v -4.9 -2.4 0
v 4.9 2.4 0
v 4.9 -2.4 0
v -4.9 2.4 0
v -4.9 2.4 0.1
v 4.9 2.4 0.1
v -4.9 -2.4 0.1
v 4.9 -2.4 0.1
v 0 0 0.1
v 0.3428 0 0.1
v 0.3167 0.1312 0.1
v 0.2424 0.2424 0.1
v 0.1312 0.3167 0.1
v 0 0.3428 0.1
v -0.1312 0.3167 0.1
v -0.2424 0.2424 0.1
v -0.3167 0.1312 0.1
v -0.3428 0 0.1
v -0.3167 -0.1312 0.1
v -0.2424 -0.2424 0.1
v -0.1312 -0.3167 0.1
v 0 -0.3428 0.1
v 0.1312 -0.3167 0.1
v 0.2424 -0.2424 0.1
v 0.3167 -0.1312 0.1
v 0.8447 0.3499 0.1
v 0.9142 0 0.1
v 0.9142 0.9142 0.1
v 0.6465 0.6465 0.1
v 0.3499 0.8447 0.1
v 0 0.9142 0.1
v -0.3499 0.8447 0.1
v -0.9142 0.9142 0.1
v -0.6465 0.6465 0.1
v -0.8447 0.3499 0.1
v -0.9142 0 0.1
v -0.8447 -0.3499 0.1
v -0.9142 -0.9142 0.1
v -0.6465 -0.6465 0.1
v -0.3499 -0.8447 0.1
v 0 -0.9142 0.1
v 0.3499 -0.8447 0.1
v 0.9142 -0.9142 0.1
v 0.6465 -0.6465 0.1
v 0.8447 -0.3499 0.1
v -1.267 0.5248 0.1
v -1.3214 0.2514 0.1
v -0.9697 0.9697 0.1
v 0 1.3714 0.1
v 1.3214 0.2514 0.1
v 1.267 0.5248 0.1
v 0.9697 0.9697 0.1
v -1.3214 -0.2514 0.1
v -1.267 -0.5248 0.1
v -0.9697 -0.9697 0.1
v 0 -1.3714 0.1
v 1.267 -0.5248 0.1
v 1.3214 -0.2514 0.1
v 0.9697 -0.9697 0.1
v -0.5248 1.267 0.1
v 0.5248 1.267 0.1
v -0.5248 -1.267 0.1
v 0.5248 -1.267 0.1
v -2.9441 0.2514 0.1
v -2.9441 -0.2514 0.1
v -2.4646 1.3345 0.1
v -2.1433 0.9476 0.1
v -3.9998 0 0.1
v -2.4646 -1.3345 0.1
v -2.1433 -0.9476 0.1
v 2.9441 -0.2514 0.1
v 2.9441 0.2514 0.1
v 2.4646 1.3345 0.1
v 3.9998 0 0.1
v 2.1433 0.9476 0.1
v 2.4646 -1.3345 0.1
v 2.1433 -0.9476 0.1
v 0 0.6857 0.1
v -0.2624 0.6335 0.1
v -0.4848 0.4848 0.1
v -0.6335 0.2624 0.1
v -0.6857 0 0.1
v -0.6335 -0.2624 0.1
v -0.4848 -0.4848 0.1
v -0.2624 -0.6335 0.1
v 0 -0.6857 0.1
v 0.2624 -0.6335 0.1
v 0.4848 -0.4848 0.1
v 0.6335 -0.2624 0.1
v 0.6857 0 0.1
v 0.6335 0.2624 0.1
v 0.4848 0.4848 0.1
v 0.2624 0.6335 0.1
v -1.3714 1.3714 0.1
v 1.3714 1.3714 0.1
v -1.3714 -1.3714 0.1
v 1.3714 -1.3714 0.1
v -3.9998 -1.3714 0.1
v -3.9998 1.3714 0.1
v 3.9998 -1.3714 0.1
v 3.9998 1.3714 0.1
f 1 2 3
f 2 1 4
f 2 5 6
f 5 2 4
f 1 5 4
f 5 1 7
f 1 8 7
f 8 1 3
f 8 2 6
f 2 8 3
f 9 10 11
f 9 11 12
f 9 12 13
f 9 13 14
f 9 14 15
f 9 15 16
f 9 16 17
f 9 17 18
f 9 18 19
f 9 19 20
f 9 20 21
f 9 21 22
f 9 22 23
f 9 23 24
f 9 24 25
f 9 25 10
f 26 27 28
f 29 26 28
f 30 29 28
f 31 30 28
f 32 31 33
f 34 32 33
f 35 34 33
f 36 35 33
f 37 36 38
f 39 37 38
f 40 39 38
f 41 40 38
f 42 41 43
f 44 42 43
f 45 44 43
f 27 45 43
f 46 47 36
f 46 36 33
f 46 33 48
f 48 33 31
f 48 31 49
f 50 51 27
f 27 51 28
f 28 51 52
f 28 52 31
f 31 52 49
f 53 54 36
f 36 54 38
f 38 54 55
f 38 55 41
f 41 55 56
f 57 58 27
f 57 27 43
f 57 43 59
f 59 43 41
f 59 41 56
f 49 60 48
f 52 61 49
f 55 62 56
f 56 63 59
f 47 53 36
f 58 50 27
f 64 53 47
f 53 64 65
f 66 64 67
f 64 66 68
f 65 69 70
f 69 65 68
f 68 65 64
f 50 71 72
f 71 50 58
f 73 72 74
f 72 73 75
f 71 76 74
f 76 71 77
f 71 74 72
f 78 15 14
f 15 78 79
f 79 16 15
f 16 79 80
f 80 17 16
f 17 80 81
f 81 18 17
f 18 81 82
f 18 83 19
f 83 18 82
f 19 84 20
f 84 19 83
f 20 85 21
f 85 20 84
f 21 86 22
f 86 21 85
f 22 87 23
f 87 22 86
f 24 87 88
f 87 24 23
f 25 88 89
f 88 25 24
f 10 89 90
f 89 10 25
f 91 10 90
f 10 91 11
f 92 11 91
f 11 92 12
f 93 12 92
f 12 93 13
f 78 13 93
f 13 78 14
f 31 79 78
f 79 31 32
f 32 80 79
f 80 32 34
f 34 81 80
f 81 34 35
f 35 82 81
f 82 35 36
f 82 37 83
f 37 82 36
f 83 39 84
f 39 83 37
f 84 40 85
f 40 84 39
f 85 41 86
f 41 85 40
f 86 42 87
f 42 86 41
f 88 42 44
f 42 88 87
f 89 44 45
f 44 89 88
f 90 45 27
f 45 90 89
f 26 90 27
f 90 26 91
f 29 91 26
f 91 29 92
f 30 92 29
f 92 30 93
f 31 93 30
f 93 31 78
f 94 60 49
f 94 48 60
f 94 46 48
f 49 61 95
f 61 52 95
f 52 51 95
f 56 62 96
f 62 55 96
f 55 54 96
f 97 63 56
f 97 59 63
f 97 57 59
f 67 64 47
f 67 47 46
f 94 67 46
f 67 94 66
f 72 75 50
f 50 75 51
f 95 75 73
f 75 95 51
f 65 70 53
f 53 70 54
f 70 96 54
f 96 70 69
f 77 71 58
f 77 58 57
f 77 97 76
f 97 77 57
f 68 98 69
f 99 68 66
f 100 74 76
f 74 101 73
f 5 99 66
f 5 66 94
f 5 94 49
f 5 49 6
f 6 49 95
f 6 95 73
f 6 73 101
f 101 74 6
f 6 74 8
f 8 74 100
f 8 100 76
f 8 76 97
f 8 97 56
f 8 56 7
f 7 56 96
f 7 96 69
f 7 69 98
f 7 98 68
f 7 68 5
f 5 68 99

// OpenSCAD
// file: ../p/empty.scad
use <../lib.scad>
function ldraw_lib__empty() = [
// 0 Empty
// 0 Name: empty.dat
// 0 Author: Steffen [Steffen]
// 0 !LDRAW_ORG Primitive UPDATE 2015-01
// 0 !LICENSE Licensed under CC BY 4.0 : see CAreadme.txt
// 
// 0 BFC CERTIFY CCW
  [0,"BFC","CERTIFY"],
  [0,"BFC","CCW"],
// 
// 0 !HISTORY 2015-10-11 [PTadmin] Official Update 2015-01
// 
// 
// 0 // Tool MLCad cannot handle really empty files. This file is used as a workaround.
// 0 // It exceptionally contains forbidden non-LDRAW standard syntax to satisfy MLCad until it is fixed OR a different editor has become the de-facto LDRAW standard.
// 0 // The line being used here is an "impossible" conditional line which never should be visible,
// 0 // additionally hidden by a syntax explicitly hiding it from displaying.
// 
// 0 MLCAD HIDE 5 24 0 0 0 0.0001 0 0 0.0001 -0.0001 0 0 0 0
];
module ldraw_lib__empty(step=0, col=false, unit=2/5, alt=false, line=0.2, solid=!$preview)
    makepoly(ldraw_lib__empty(), step=step, col=col, unit=unit, alt=alt, line=line, solid=solid);
ldraw_lib__empty(line=0.2);
// file: ../p/4-4ndis.scad
use <../lib.scad>
function ldraw_lib__4_4ndis() = [
// 0 Disc Negative 1.0
// 0 Name: 4-4ndis.dat
// 0 Author: James Jessiman
// 0 !LDRAW_ORG Primitive UPDATE 2012-01
// 0 !LICENSE Licensed under CC BY 4.0 : see CAreadme.txt
// 
// 0 BFC CERTIFY CCW
  [0,"BFC","CERTIFY"],
  [0,"BFC","CCW"],
// 
// 0 !HISTORY 2002-03-23 [sbliss] Added BFC statement; compacted code
// 0 !HISTORY 2002-04-25 [PTadmin] Official Update 2002-02
// 0 !HISTORY 2007-06-24 [PTadmin] Header formatted for Contributor Agreement
// 0 !HISTORY 2008-07-01 [PTadmin] Official Update 2008-01
// 0 !HISTORY 2012-02-16 [Philo] Changed to CCW
// 0 !HISTORY 2012-03-30 [PTadmin] Official Update 2012-01
// 
// 
// 3 16 0.9239 0 0.3827 1 0 0 1 0 1
  [3,16,0.9239,0,0.3827,1,0,0,1,0,1],
// 3 16 0.7071 0 0.7071 0.9239 0 0.3827 1 0 1
  [3,16,0.7071,0,0.7071,0.9239,0,0.3827,1,0,1],
// 3 16 0.3827 0 0.9239 0.7071 0 0.7071 1 0 1
  [3,16,0.3827,0,0.9239,0.7071,0,0.7071,1,0,1],
// 3 16 0 0 1 0.3827 0 0.9239 1 0 1
  [3,16,0,0,1,0.3827,0,0.9239,1,0,1],
// 3 16 -0.3827 0 0.9239 0 0 1 -1 0 1
  [3,16,-0.3827,0,0.9239,0,0,1,-1,0,1],
// 3 16 -0.7071 0 0.7071 -0.3827 0 0.9239 -1 0 1
  [3,16,-0.7071,0,0.7071,-0.3827,0,0.9239,-1,0,1],
// 3 16 -0.9239 0 0.3827 -0.7071 0 0.7071 -1 0 1
  [3,16,-0.9239,0,0.3827,-0.7071,0,0.7071,-1,0,1],
// 3 16 -1 0 0 -0.9239 0 0.3827 -1 0 1
  [3,16,-1,0,0,-0.9239,0,0.3827,-1,0,1],
// 3 16 -0.9239 0 -0.3827 -1 0 0 -1 0 -1
  [3,16,-0.9239,0,-0.3827,-1,0,0,-1,0,-1],
// 3 16 -0.7071 0 -0.7071 -0.9239 0 -0.3827 -1 0 -1
  [3,16,-0.7071,0,-0.7071,-0.9239,0,-0.3827,-1,0,-1],
// 3 16 -0.3827 0 -0.9239 -0.7071 0 -0.7071 -1 0 -1
  [3,16,-0.3827,0,-0.9239,-0.7071,0,-0.7071,-1,0,-1],
// 3 16 0 0 -1 -0.3827 0 -0.9239 -1 0 -1
  [3,16,0,0,-1,-0.3827,0,-0.9239,-1,0,-1],
// 3 16 0.3827 0 -0.9239 0 0 -1 1 0 -1
  [3,16,0.3827,0,-0.9239,0,0,-1,1,0,-1],
// 3 16 0.7071 0 -0.7071 0.3827 0 -0.9239 1 0 -1
  [3,16,0.7071,0,-0.7071,0.3827,0,-0.9239,1,0,-1],
// 3 16 0.9239 0 -0.3827 0.7071 0 -0.7071 1 0 -1
  [3,16,0.9239,0,-0.3827,0.7071,0,-0.7071,1,0,-1],
// 3 16 1 0 0 0.9239 0 -0.3827 1 0 -1
  [3,16,1,0,0,0.9239,0,-0.3827,1,0,-1],
];
module ldraw_lib__4_4ndis(step=0, col=false, unit=2/5, alt=false, line=0.2, solid=!$preview)
    makepoly(ldraw_lib__4_4ndis(), step=step, col=col, unit=unit, alt=alt, line=line, solid=solid);
ldraw_lib__4_4ndis(line=0.2);
// file: ../p/4-4disc.scad
use <../lib.scad>
function ldraw_lib__4_4disc() = [
// 0 Disc 1.0
// 0 Name: 4-4disc.dat
// 0 Author: James Jessiman
// 0 !LDRAW_ORG Primitive UPDATE 2002-02
// 0 !LICENSE Licensed under CC BY 4.0 : see CAreadme.txt
// 
// 0 BFC CERTIFY CCW
  [0,"BFC","CERTIFY"],
  [0,"BFC","CCW"],
// 
// 0 !HISTORY 1998-12-15 [PTadmin] Official Update 1998-10
// 0 !HISTORY 2002-03-23 [sbliss] Added BFC statement
// 0 !HISTORY 2002-04-25 [PTadmin] Official Update 2002-02
// 0 !HISTORY 2007-06-24 [PTadmin] Header formatted for Contributor Agreement
// 0 !HISTORY 2008-07-01 [PTadmin] Official Update 2008-01
// 
// 
// 3 16 0 0 0 1 0 0 0.9239 0 0.3827
  [3,16,0,0,0,1,0,0,0.9239,0,0.3827],
// 3 16 0 0 0 0.9239 0 0.3827 0.7071 0 0.7071
  [3,16,0,0,0,0.9239,0,0.3827,0.7071,0,0.7071],
// 3 16 0 0 0 0.7071 0 0.7071 0.3827 0 0.9239
  [3,16,0,0,0,0.7071,0,0.7071,0.3827,0,0.9239],
// 3 16 0 0 0 0.3827 0 0.9239 0 0 1
  [3,16,0,0,0,0.3827,0,0.9239,0,0,1],
// 3 16 0 0 0 0 0 1 -0.3827 0 0.9239
  [3,16,0,0,0,0,0,1,-0.3827,0,0.9239],
// 3 16 0 0 0 -0.3827 0 0.9239 -0.7071 0 0.7071
  [3,16,0,0,0,-0.3827,0,0.9239,-0.7071,0,0.7071],
// 3 16 0 0 0 -0.7071 0 0.7071 -0.9239 0 0.3827
  [3,16,0,0,0,-0.7071,0,0.7071,-0.9239,0,0.3827],
// 3 16 0 0 0 -0.9239 0 0.3827 -1 0 -0
  [3,16,0,0,0,-0.9239,0,0.3827,-1,0,-0],
// 3 16 0 0 0 -1 0 -0 -0.9239 0 -0.3827
  [3,16,0,0,0,-1,0,-0,-0.9239,0,-0.3827],
// 3 16 0 0 0 -0.9239 0 -0.3827 -0.7071 0 -0.7071
  [3,16,0,0,0,-0.9239,0,-0.3827,-0.7071,0,-0.7071],
// 3 16 0 0 0 -0.7071 0 -0.7071 -0.3827 0 -0.9239
  [3,16,0,0,0,-0.7071,0,-0.7071,-0.3827,0,-0.9239],
// 3 16 0 0 0 -0.3827 0 -0.9239 0 0 -1
  [3,16,0,0,0,-0.3827,0,-0.9239,0,0,-1],
// 3 16 0 0 0 0 0 -1 0.3827 0 -0.9239
  [3,16,0,0,0,0,0,-1,0.3827,0,-0.9239],
// 3 16 0 0 0 0.3827 0 -0.9239 0.7071 0 -0.7071
  [3,16,0,0,0,0.3827,0,-0.9239,0.7071,0,-0.7071],
// 3 16 0 0 0 0.7071 0 -0.7071 0.9239 0 -0.3827
  [3,16,0,0,0,0.7071,0,-0.7071,0.9239,0,-0.3827],
// 3 16 0 0 0 0.9239 0 -0.3827 1 0 0
  [3,16,0,0,0,0.9239,0,-0.3827,1,0,0],
// 0
];
module ldraw_lib__4_4disc(step=0, col=false, unit=2/5, alt=false, line=0.2, solid=!$preview)
    makepoly(ldraw_lib__4_4disc(), step=step, col=col, unit=unit, alt=alt, line=line, solid=solid);
ldraw_lib__4_4disc(line=0.2);
// file: ../p/1-8chrd.scad
use <../lib.scad>
function ldraw_lib__1_8chrd() = [
// 0 Chord 0.125
// 0 Name: 1-8chrd.dat
// 0 Author: Orion Pobursky [OrionP]
// 0 !LDRAW_ORG Primitive UPDATE 2023-05
// 0 !LICENSE Licensed under CC BY 4.0 : see CAreadme.txt
// 
// 0 BFC CERTIFY CCW
  [0,"BFC","CERTIFY"],
  [0,"BFC","CCW"],
// 
// 0 !HISTORY 2004-04-22 [PTadmin] Official Update 2004-02
// 0 !HISTORY 2007-06-22 [PTadmin] Header formatted for Contributor Agreement
// 0 !HISTORY 2008-07-01 [PTadmin] Official Update 2008-01
// 0 !HISTORY 2023-10-27 [OrionP] Rebuilt with PrimGen2, original author westrate
// 0 !HISTORY 2023-10-31 [OrionP] Official Update 2023-05
// 
// 3 16 1 0 0 0.9239 0 0.3827 0.7071 0 0.7071
  [3,16,1,0,0,0.9239,0,0.3827,0.7071,0,0.7071],
];
module ldraw_lib__1_8chrd(step=0, col=false, unit=2/5, alt=false, line=0.2, solid=!$preview)
    makepoly(ldraw_lib__1_8chrd(), step=step, col=col, unit=unit, alt=alt, line=line, solid=solid);
ldraw_lib__1_8chrd(line=0.2);
// file: ../p/1-16chrd.scad
use <../lib.scad>
use <empty.scad>
function ldraw_lib__1_16chrd() = [
// 0 Chord 0.0625
// 0 Name: 1-16chrd.dat
// 0 Author: Philippe Hurbain [Philo]
// 0 !LDRAW_ORG Primitive UPDATE 2015-01
// 0 !LICENSE Licensed under CC BY 4.0 : see CAreadme.txt
// 
// 0 BFC CERTIFY CCW
  [0,"BFC","CERTIFY"],
  [0,"BFC","CCW"],
// 
// 0 !HISTORY 2015-10-11 [PTadmin] Official Update 2015-01
// 
// 
// 0 // This file is intentionally empty because at the current \P resolution,
// 0 // an 1-16chrd is actually empty. However, this file still is present
// 0 // to allow tools to do primitives substition and fill in a real chrd here,
// 0 // or, if desired, to substitute this with the hi-res 48\1-16chrd.
// 
// 0 // This file is based on an idea by Darats at http://forums.ldraw.org/read.php?19,14500,14500#msg-14500
// 
// 1 16 0 0 0 1 0 0 0 1 0 0 0 1 empty.dat
  [1,16,0,0,0,1,0,0,0,1,0,0,0,1, ldraw_lib__empty()],
];
module ldraw_lib__1_16chrd(step=0, col=false, unit=2/5, alt=false, line=0.2, solid=!$preview)
    makepoly(ldraw_lib__1_16chrd(), step=step, col=col, unit=unit, alt=alt, line=line, solid=solid);
ldraw_lib__1_16chrd(line=0.2);
// file: ../p/4-4ring3.scad
use <../lib.scad>
function ldraw_lib__4_4ring3() = [
// 0 Ring  3 x 1.0
// 0 Name: 4-4ring3.dat
// 0 Author: James Jessiman
// 0 !LDRAW_ORG Primitive UPDATE 2009-01
// 0 !LICENSE Licensed under CC BY 4.0 : see CAreadme.txt
// 
// 0 BFC CERTIFY CCW
  [0,"BFC","CERTIFY"],
  [0,"BFC","CCW"],
// 
// 0 !HISTORY 1998-12-15 [PTadmin] Official Update 1998-10
// 0 !HISTORY 2002-04-05 [hafhead] Added BFC statement
// 0 !HISTORY 2002-04-25 [PTadmin] Official Update 2002-02
// 0 !HISTORY 2007-06-24 [PTadmin] Header formatted for Contributor Agreement
// 0 !HISTORY 2008-07-01 [PTadmin] Official Update 2008-01
// 0 !HISTORY 2008-08-26 [cwdee] Switch polygon winding and rename
// 0 !HISTORY 2009-05-02 [PTadmin] Official Update 2009-01
// 
// 
// 4 16 -1.5308 0 3.6956 -1.1481 0 2.7717 0 0 3 0 0 4
  [4,16,-1.5308,0,3.6956,-1.1481,0,2.7717,0,0,3,0,0,4],
// 4 16 -2.8284 0 2.8284 -2.1213 0 2.1213 -1.1481 0 2.7717 -1.5308 0 3.6956
  [4,16,-2.8284,0,2.8284,-2.1213,0,2.1213,-1.1481,0,2.7717,-1.5308,0,3.6956],
// 4 16 -3.6956 0 1.5308 -2.7717 0 1.1481 -2.1213 0 2.1213 -2.8284 0 2.8284
  [4,16,-3.6956,0,1.5308,-2.7717,0,1.1481,-2.1213,0,2.1213,-2.8284,0,2.8284],
// 4 16 -4 0 0 -3 0 0 -2.7717 0 1.1481 -3.6956 0 1.5308
  [4,16,-4,0,0,-3,0,0,-2.7717,0,1.1481,-3.6956,0,1.5308],
// 4 16 -3.6956 0 -1.5308 -2.7717 0 -1.1481 -3 0 0 -4 0 0
  [4,16,-3.6956,0,-1.5308,-2.7717,0,-1.1481,-3,0,0,-4,0,0],
// 4 16 -2.8284 0 -2.8284 -2.1213 0 -2.1213 -2.7717 0 -1.1481 -3.6956 0 -1.5308
  [4,16,-2.8284,0,-2.8284,-2.1213,0,-2.1213,-2.7717,0,-1.1481,-3.6956,0,-1.5308],
// 4 16 -1.5308 0 -3.6956 -1.1481 0 -2.7717 -2.1213 0 -2.1213 -2.8284 0 -2.8284
  [4,16,-1.5308,0,-3.6956,-1.1481,0,-2.7717,-2.1213,0,-2.1213,-2.8284,0,-2.8284],
// 4 16 0 0 -4 0 0 -3 -1.1481 0 -2.7717 -1.5308 0 -3.6956
  [4,16,0,0,-4,0,0,-3,-1.1481,0,-2.7717,-1.5308,0,-3.6956],
// 4 16 1.5308 0 -3.6956 1.1481 0 -2.7717 0 0 -3 0 0 -4
  [4,16,1.5308,0,-3.6956,1.1481,0,-2.7717,0,0,-3,0,0,-4],
// 4 16 2.8284 0 -2.8284 2.1213 0 -2.1213 1.1481 0 -2.7717 1.5308 0 -3.6956
  [4,16,2.8284,0,-2.8284,2.1213,0,-2.1213,1.1481,0,-2.7717,1.5308,0,-3.6956],
// 4 16 3.6956 0 -1.5308 2.7717 0 -1.1481 2.1213 0 -2.1213 2.8284 0 -2.8284
  [4,16,3.6956,0,-1.5308,2.7717,0,-1.1481,2.1213,0,-2.1213,2.8284,0,-2.8284],
// 4 16 4 0 0 3 0 0 2.7717 0 -1.1481 3.6956 0 -1.5308
  [4,16,4,0,0,3,0,0,2.7717,0,-1.1481,3.6956,0,-1.5308],
// 4 16 3.6956 0 1.5308 2.7717 0 1.1481 3 0 0 4 0 0
  [4,16,3.6956,0,1.5308,2.7717,0,1.1481,3,0,0,4,0,0],
// 4 16 2.8284 0 2.8284 2.1213 0 2.1213 2.7717 0 1.1481 3.6956 0 1.5308
  [4,16,2.8284,0,2.8284,2.1213,0,2.1213,2.7717,0,1.1481,3.6956,0,1.5308],
// 4 16 1.5308 0 3.6956 1.1481 0 2.7717 2.1213 0 2.1213 2.8284 0 2.8284
  [4,16,1.5308,0,3.6956,1.1481,0,2.7717,2.1213,0,2.1213,2.8284,0,2.8284],
// 4 16 0 0 4 0 0 3 1.1481 0 2.7717 1.5308 0 3.6956
  [4,16,0,0,4,0,0,3,1.1481,0,2.7717,1.5308,0,3.6956],
// 0
];
module ldraw_lib__4_4ring3(step=0, col=false, unit=2/5, alt=false, line=0.2, solid=!$preview)
    makepoly(ldraw_lib__4_4ring3(), step=step, col=col, unit=unit, alt=alt, line=line, solid=solid);
ldraw_lib__4_4ring3(line=0.2);
// file: ../p/4-4ring1.scad
use <../lib.scad>
function ldraw_lib__4_4ring1() = [
// 0 Ring  1 x 1.0
// 0 Name: 4-4ring1.dat
// 0 Author: James Jessiman
// 0 !LDRAW_ORG Primitive UPDATE 2009-01
// 0 !LICENSE Licensed under CC BY 4.0 : see CAreadme.txt
// 
// 0 BFC CERTIFY CCW
  [0,"BFC","CERTIFY"],
  [0,"BFC","CCW"],
// 
// 0 !HISTORY 1998-12-15 [PTadmin] Official Update 1998-10
// 0 !HISTORY 2002-04-08 [BrickCaster] Modified for BFC compliance
// 0 !HISTORY 2002-04-25 [PTadmin] Official Update 2002-02
// 0 !HISTORY 2007-06-24 [PTadmin] Header formatted for Contributor Agreement
// 0 !HISTORY 2008-07-01 [PTadmin] Official Update 2008-01
// 0 !HISTORY 2008-08-26 [cwdee] Switch polygon winding and rename
// 0 !HISTORY 2009-05-02 [PTadmin] Official Update 2009-01
// 
// 
// 4 16 -0.7654 0 1.8478 -0.3827 0 0.9239 0 0 1 0 0 2
  [4,16,-0.7654,0,1.8478,-0.3827,0,0.9239,0,0,1,0,0,2],
// 4 16 -1.4142 0 1.4142 -0.7071 0 0.7071 -0.3827 0 0.9239 -0.7654 0 1.8478
  [4,16,-1.4142,0,1.4142,-0.7071,0,0.7071,-0.3827,0,0.9239,-0.7654,0,1.8478],
// 4 16 -1.8478 0 0.7654 -0.9239 0 0.3827 -0.7071 0 0.7071 -1.4142 0 1.41420
  [4,16,-1.8478,0,0.7654,-0.9239,0,0.3827,-0.7071,0,0.7071,-1.4142,0,1.41420],
// 4 16 -2 0 0 -1 0 0 -0.9239 0 0.3827 -1.8478 0 0.7654
  [4,16,-2,0,0,-1,0,0,-0.9239,0,0.3827,-1.8478,0,0.7654],
// 4 16 -1.8478 0 -0.7654 -0.9239 0 -0.3827 -1 0 0 -2 0 0
  [4,16,-1.8478,0,-0.7654,-0.9239,0,-0.3827,-1,0,0,-2,0,0],
// 4 16 -1.4142 0 -1.4142 -0.7071 0 -0.7071 -0.9239 0 -0.3827 -1.8478 0 -0.7654
  [4,16,-1.4142,0,-1.4142,-0.7071,0,-0.7071,-0.9239,0,-0.3827,-1.8478,0,-0.7654],
// 4 16 -0.7654 0 -1.8478 -0.3827 0 -0.9239 -0.7071 0 -0.7071 -1.4142 0 -1.4142
  [4,16,-0.7654,0,-1.8478,-0.3827,0,-0.9239,-0.7071,0,-0.7071,-1.4142,0,-1.4142],
// 4 16 0 0 -2 0 0 -1 -0.3827 0 -0.9239 -0.7654 0 -1.8478
  [4,16,0,0,-2,0,0,-1,-0.3827,0,-0.9239,-0.7654,0,-1.8478],
// 4 16 0.7654 0 -1.8478 0.3827 0 -0.9239 0 0 -1 0 0 -2
  [4,16,0.7654,0,-1.8478,0.3827,0,-0.9239,0,0,-1,0,0,-2],
// 4 16 1.4142 0 -1.4142 0.7071 0 -0.7071 0.3827 0 -0.9239 0.7654 0 -1.8478
  [4,16,1.4142,0,-1.4142,0.7071,0,-0.7071,0.3827,0,-0.9239,0.7654,0,-1.8478],
// 4 16 1.8478 0 -0.7654 0.9239 0 -0.3827 0.7071 0 -0.7071 1.4142 0 -1.4142
  [4,16,1.8478,0,-0.7654,0.9239,0,-0.3827,0.7071,0,-0.7071,1.4142,0,-1.4142],
// 4 16 2 0 0 1 0 0 0.9239 0 -0.3827 1.8478 0 -0.7654
  [4,16,2,0,0,1,0,0,0.9239,0,-0.3827,1.8478,0,-0.7654],
// 4 16 1.8478 0 0.7654 0.9239 0 0.3827 1 0 0 2 0 0
  [4,16,1.8478,0,0.7654,0.9239,0,0.3827,1,0,0,2,0,0],
// 4 16 1.4142 0 1.4142 0.7071 0 0.7071 0.9239 0 0.3827 1.8478 0 0.7654
  [4,16,1.4142,0,1.4142,0.7071,0,0.7071,0.9239,0,0.3827,1.8478,0,0.7654],
// 4 16 0.7654 0 1.8478 0.3827 0 0.9239 0.7071 0 0.7071 1.4142 0 1.4142
  [4,16,0.7654,0,1.8478,0.3827,0,0.9239,0.7071,0,0.7071,1.4142,0,1.4142],
// 4 16 0 0 2 0 0 1 0.3827 0 0.9239 0.7654 0 1.8478
  [4,16,0,0,2,0,0,1,0.3827,0,0.9239,0.7654,0,1.8478],
// 0
];
module ldraw_lib__4_4ring1(step=0, col=false, unit=2/5, alt=false, line=0.2, solid=!$preview)
    makepoly(ldraw_lib__4_4ring1(), step=step, col=col, unit=unit, alt=alt, line=line, solid=solid);
ldraw_lib__4_4ring1(line=0.2);
// file: ../p/3-16ndis.scad
use <../lib.scad>
function ldraw_lib__3_16ndis() = [
// 0 Disc Negative 0.1875
// 0 Name: 3-16ndis.dat
// 0 Author: Guy Vivan [guyvivan]
// 0 !LDRAW_ORG Primitive UPDATE 2009-01
// 0 !LICENSE Licensed under CC BY 2.0 and CC BY 4.0 : see CAreadme.txt
// 
// 0 BFC CERTIFY CCW
  [0,"BFC","CERTIFY"],
  [0,"BFC","CCW"],
// 
// 0 !HISTORY 2009-05-02 [PTadmin] Official Update 2009-01
// 
// 
// 3 16 1 0 1 0.9239 0 0.3827 1 0 0
  [3,16,1,0,1,0.9239,0,0.3827,1,0,0],
// 3 16 1 0 1 0.7071 0 0.7071 0.9239 0 0.3827
  [3,16,1,0,1,0.7071,0,0.7071,0.9239,0,0.3827],
// 3 16 1 0 1 0.3827 0 0.9239 0.7071 0 0.7071
  [3,16,1,0,1,0.3827,0,0.9239,0.7071,0,0.7071],
// 
// 0 end of file
// 
];
module ldraw_lib__3_16ndis(step=0, col=false, unit=2/5, alt=false, line=0.2, solid=!$preview)
    makepoly(ldraw_lib__3_16ndis(), step=step, col=col, unit=unit, alt=alt, line=line, solid=solid);
ldraw_lib__3_16ndis(line=0.2);
// file: ../p/logo-train-2006.scad
use <../lib.scad>
use <1-16chrd.scad>
use <1-8chrd.scad>
use <4-4disc.scad>
use <4-4ndis.scad>
function ldraw_lib__logo_train_2006() = [
// 0 Logo Train 2006
// 0 Name: logo-train-2006.dat
// 0 Author: Gerald Lasser [GeraldLasser]
// 0 !LDRAW_ORG Primitive UPDATE 2023-07
// 0 !LICENSE Licensed under CC BY 4.0 : see CAreadme.txt
// 
// 0 BFC CERTIFY CCW
  [0,"BFC","CERTIFY"],
  [0,"BFC","CCW"],
// 
// 0 !HISTORY 2023-12-31 [OrionP] Official Update 2023-07
// 
// 
// 1 16 0 -.25 0 3 0 0 0 1 0 0 0 3 4-4disc.dat
  [1,16,0,-.25,0,3,0,0,0,1,0,0,0,3, ldraw_lib__4_4disc()],
// 1 16 0 -.25 0 8 0 0 0 1 0 0 0 8 4-4ndis.dat
  [1,16,0,-.25,0,8,0,0,0,1,0,0,0,8, ldraw_lib__4_4ndis()],
// 3 16 -11.0868 -.25 4.5924 -11.5625 -.25 2.2 -8 -.25 0
  [3,16,-11.0868,-.25,4.5924,-11.5625,-.25,2.2,-8,-.25,0],
// 3 16 -11.0868 -.25 4.5924 -8 -.25 0 -8 -.25 8
  [3,16,-11.0868,-.25,4.5924,-8,-.25,0,-8,-.25,8],
// 3 16 -11.0868 -.25 4.5924 -8 -.25 8 -8.4852 -.25 8.4852
  [3,16,-11.0868,-.25,4.5924,-8,-.25,8,-8.4852,-.25,8.4852],
// 3 16 -8.4852 -.25 8.4852 -8 -.25 8 0 -.25 8
  [3,16,-8.4852,-.25,8.4852,-8,-.25,8,0,-.25,8],
// 3 16 -8.4852 -.25 8.4852 0 -.25 8 0 -.25 12
  [3,16,-8.4852,-.25,8.4852,0,-.25,8,0,-.25,12],
// 3 16 11.5625 -.25 2.2 11.0868 -.25 4.5924 8 -.25 0
  [3,16,11.5625,-.25,2.2,11.0868,-.25,4.5924,8,-.25,0],
// 3 16 8 -.25 0 11.0868 -.25 4.5924 8 -.25 8
  [3,16,8,-.25,0,11.0868,-.25,4.5924,8,-.25,8],
// 3 16 8 -.25 8 11.0868 -.25 4.5924 8.4852 -.25 8.4852
  [3,16,8,-.25,8,11.0868,-.25,4.5924,8.4852,-.25,8.4852],
// 3 16 8 -.25 8 8.4852 -.25 8.4852 0 -.25 8
  [3,16,8,-.25,8,8.4852,-.25,8.4852,0,-.25,8],
// 3 16 0 -.25 8 8.4852 -.25 8.4852 0 -.25 12
  [3,16,0,-.25,8,8.4852,-.25,8.4852,0,-.25,12],
// 
// 3 16 -11.5625 -.25 -2.2 -11.0868 -.25 -4.5924 -8 -.25 0
  [3,16,-11.5625,-.25,-2.2,-11.0868,-.25,-4.5924,-8,-.25,0],
// 3 16 -8 -.25 0 -11.0868 -.25 -4.5924 -8 -.25 -8
  [3,16,-8,-.25,0,-11.0868,-.25,-4.5924,-8,-.25,-8],
// 3 16 -8 -.25 -8 -11.0868 -.25 -4.5924 -8.4852 -.25 -8.4852
  [3,16,-8,-.25,-8,-11.0868,-.25,-4.5924,-8.4852,-.25,-8.4852],
// 3 16 -8 -.25 -8 -8.4852 -.25 -8.4852 0 -.25 -8
  [3,16,-8,-.25,-8,-8.4852,-.25,-8.4852,0,-.25,-8],
// 3 16 0 -.25 -8 -8.4852 -.25 -8.4852 0 -.25 -12
  [3,16,0,-.25,-8,-8.4852,-.25,-8.4852,0,-.25,-12],
// 3 16 11.0868 -.25 -4.5924 11.5625 -.25 -2.2 8 -.25 0
  [3,16,11.0868,-.25,-4.5924,11.5625,-.25,-2.2,8,-.25,0],
// 3 16 11.0868 -.25 -4.5924 8 -.25 0 8 -.25 -8
  [3,16,11.0868,-.25,-4.5924,8,-.25,0,8,-.25,-8],
// 3 16 11.0868 -.25 -4.5924 8 -.25 -8 8.4852 -.25 -8.4852
  [3,16,11.0868,-.25,-4.5924,8,-.25,-8,8.4852,-.25,-8.4852],
// 3 16 8.4852 -.25 -8.4852 8 -.25 -8 0 -.25 -8
  [3,16,8.4852,-.25,-8.4852,8,-.25,-8,0,-.25,-8],
// 3 16 8.4852 -.25 -8.4852 0 -.25 -8 0 -.25 -12
  [3,16,8.4852,-.25,-8.4852,0,-.25,-8,0,-.25,-12],
// 
// 1 16 0 -.25 0 0 0 -12 0 1 0 12 0 0 1-8chrd.dat
  [1,16,0,-.25,0,0,0,-12,0,1,0,12,0,0, ldraw_lib__1_8chrd()],
// 1 16 0 -.25 0 0 0 12 0 1 0 12 0 0 1-8chrd.dat
  [1,16,0,-.25,0,0,0,12,0,1,0,12,0,0, ldraw_lib__1_8chrd()],
// 1 16 0 -.25 0 -8.48528 0 -8.48528 0 1 0 8.48528 0 -8.48528 1-16chrd.dat
  [1,16,0,-.25,0,-8.48528,0,-8.48528,0,1,0,8.48528,0,-8.48528, ldraw_lib__1_16chrd()],
// 1 16 0 -.25 0 8.48528 0 8.48528 0 1 0 8.48528 0 -8.48528 1-16chrd.dat
  [1,16,0,-.25,0,8.48528,0,8.48528,0,1,0,8.48528,0,-8.48528, ldraw_lib__1_16chrd()],
// 1 16 0 -.25 0 0 0 -12 0 1 0 -12 0 0 1-8chrd.dat
  [1,16,0,-.25,0,0,0,-12,0,1,0,-12,0,0, ldraw_lib__1_8chrd()],
// 1 16 0 -.25 0 0 0 12 0 1 0 -12 0 0 1-8chrd.dat
  [1,16,0,-.25,0,0,0,12,0,1,0,-12,0,0, ldraw_lib__1_8chrd()],
// 1 16 0 -.25 0 -8.48528 0 -8.48528 0 1 0 -8.48528 0 8.48528 1-16chrd.dat
  [1,16,0,-.25,0,-8.48528,0,-8.48528,0,1,0,-8.48528,0,8.48528, ldraw_lib__1_16chrd()],
// 1 16 0 -.25 0 8.48528 0 8.48528 0 1 0 -8.48528 0 8.48528 1-16chrd.dat
  [1,16,0,-.25,0,8.48528,0,8.48528,0,1,0,-8.48528,0,8.48528, ldraw_lib__1_16chrd()],
// 
// 3 16 -11.5625 -.25 2.2 -11.5625 -.25 -2.2 -8 -.25 0
  [3,16,-11.5625,-.25,2.2,-11.5625,-.25,-2.2,-8,-.25,0],
// 3 16 11.5625 -.25 -2.2 11.5625 -.25 2.2 8 -.25 0
  [3,16,11.5625,-.25,-2.2,11.5625,-.25,2.2,8,-.25,0],
// 4 16 -25.7625 -.25 2.2 -25.7625 -.25 -2.2 -11.5625 -.25 -2.2 -11.5625 -.25 2.2
  [4,16,-25.7625,-.25,2.2,-25.7625,-.25,-2.2,-11.5625,-.25,-2.2,-11.5625,-.25,2.2],
// 4 16 -35 -.25 0 -25.7625 -.25 2.2 -18.755 -.25 8.2915 -21.5662 -.25 11.6778
  [4,16,-35,-.25,0,-25.7625,-.25,2.2,-18.755,-.25,8.2915,-21.5662,-.25,11.6778],
// 4 16 -18.755 -.25 -8.2915 -25.7625 -.25 -2.2 -35 -.25 0 -21.5662 -.25 -11.6778
  [4,16,-18.755,-.25,-8.2915,-25.7625,-.25,-2.2,-35,-.25,0,-21.5662,-.25,-11.6778],
// 3 16 -35 -.25 0 -25.7625 -.25 -2.2 -25.7625 -.25 2.2
  [3,16,-35,-.25,0,-25.7625,-.25,-2.2,-25.7625,-.25,2.2],
// 4 16 11.5625 -.25 -2.2 25.7625 -.25 -2.2 25.7625 -.25 2.2 11.5625 -.25 2.2
  [4,16,11.5625,-.25,-2.2,25.7625,-.25,-2.2,25.7625,-.25,2.2,11.5625,-.25,2.2],
// 4 16 18.755 -.25 8.2915 25.7625 -.25 2.2 35 -.25 0 21.5662 -.25 11.6778
  [4,16,18.755,-.25,8.2915,25.7625,-.25,2.2,35,-.25,0,21.5662,-.25,11.6778],
// 4 16 35 -.25 0 25.7625 -.25 -2.2 18.755 -.25 -8.2915 21.5662 -.25 -11.6778
  [4,16,35,-.25,0,25.7625,-.25,-2.2,18.755,-.25,-8.2915,21.5662,-.25,-11.6778],
// 3 16 25.7625 -.25 -2.2 35 -.25 0 25.7625 -.25 2.2
  [3,16,25.7625,-.25,-2.2,35,-.25,0,25.7625,-.25,2.2],
];
module ldraw_lib__logo_train_2006(step=0, col=false, unit=2/5, alt=false, line=0.2, solid=!$preview)
    makepoly(ldraw_lib__logo_train_2006(), step=step, col=col, unit=unit, alt=alt, line=line, solid=solid);
ldraw_lib__logo_train_2006(line=0.2);
// file: ../p/logo-train-2006-box.scad
use <../lib.scad>
use <3-16ndis.scad>
use <4-4ring1.scad>
use <4-4ring3.scad>
function ldraw_lib__logo_train_2006_box() = [
// 0 Logo Train 2006 Outer Box
// 0 Name: logo-train-2006-box.dat
// 0 Author: Gerald Lasser [GeraldLasser]
// 0 !LDRAW_ORG Primitive UPDATE 2023-07
// 0 !LICENSE Licensed under CC BY 4.0 : see CAreadme.txt
// 
// 0 BFC CERTIFY CCW
  [0,"BFC","CERTIFY"],
  [0,"BFC","CCW"],
// 
// 0 !HISTORY 2023-12-31 [OrionP] Official Update 2023-07
// 
// 
// 1 16 0 -.25 0 3 0 0 0 1 0 0 0 3 4-4ring1.dat
  [1,16,0,-.25,0,3,0,0,0,1,0,0,0,3, ldraw_lib__4_4ring1()],
// 1 16 0 -.25 0 2 0 0 0 1 0 0 0 2 4-4ring3.dat
  [1,16,0,-.25,0,2,0,0,0,1,0,0,0,2, ldraw_lib__4_4ring3()],
// 1 16 0 -.25 0 0 0 -12 0 1 0 12 0 0 3-16ndis.dat
  [1,16,0,-.25,0,0,0,-12,0,1,0,12,0,0, ldraw_lib__3_16ndis()],
// 1 16 0 -.25 0 0 0 12 0 1 0 12 0 0 3-16ndis.dat
  [1,16,0,-.25,0,0,0,12,0,1,0,12,0,0, ldraw_lib__3_16ndis()],
// 1 16 0 -.25 0 0 0 -12 0 1 0 -12 0 0 3-16ndis.dat
  [1,16,0,-.25,0,0,0,-12,0,1,0,-12,0,0, ldraw_lib__3_16ndis()],
// 1 16 0 -.25 0 0 0 12 0 1 0 -12 0 0 3-16ndis.dat
  [1,16,0,-.25,0,0,0,12,0,1,0,-12,0,0, ldraw_lib__3_16ndis()],
// 
// 3 16 -18.755 -.25 8.2915 -25.7625 -.25 2.2 -11.5625 -.25 2.2
  [3,16,-18.755,-.25,8.2915,-25.7625,-.25,2.2,-11.5625,-.25,2.2],
// 3 16 -18.755 -.25 8.2915 -11.5625 -.25 2.2 -11.0868 -.25 4.5924
  [3,16,-18.755,-.25,8.2915,-11.5625,-.25,2.2,-11.0868,-.25,4.5924],
// 4 16 -12 -.25 12 -21.5662 -.25 11.6778 -18.755 -.25 8.2915 -11.0868 -.25 4.5924
  [4,16,-12,-.25,12,-21.5662,-.25,11.6778,-18.755,-.25,8.2915,-11.0868,-.25,4.5924],
// 3 16 25.7625 -.25 2.2 18.755 -.25 8.2915 11.5625 -.25 2.2
  [3,16,25.7625,-.25,2.2,18.755,-.25,8.2915,11.5625,-.25,2.2],
// 3 16 11.5625 -.25 2.2 18.755 -.25 8.2915 11.0868 -.25 4.5924
  [3,16,11.5625,-.25,2.2,18.755,-.25,8.2915,11.0868,-.25,4.5924],
// 4 16 18.755 -.25 8.2915 21.5662 -.25 11.6778 12 -.25 12 11.0868 -.25 4.5924
  [4,16,18.755,-.25,8.2915,21.5662,-.25,11.6778,12,-.25,12,11.0868,-.25,4.5924],
// 3 16 -25.7625 -.25 -2.2 -18.755 -.25 -8.2915 -11.5625 -.25 -2.2
  [3,16,-25.7625,-.25,-2.2,-18.755,-.25,-8.2915,-11.5625,-.25,-2.2],
// 3 16 -11.5625 -.25 -2.2 -18.755 -.25 -8.2915 -11.0868 -.25 -4.5924
  [3,16,-11.5625,-.25,-2.2,-18.755,-.25,-8.2915,-11.0868,-.25,-4.5924],
// 4 16 -18.755 -.25 -8.2915 -21.5662 -.25 -11.6778 -12 -.25 -12 -11.0868 -.25 -4.5924
  [4,16,-18.755,-.25,-8.2915,-21.5662,-.25,-11.6778,-12,-.25,-12,-11.0868,-.25,-4.5924],
// 3 16 18.755 -.25 -8.2915 25.7625 -.25 -2.2 11.5625 -.25 -2.2
  [3,16,18.755,-.25,-8.2915,25.7625,-.25,-2.2,11.5625,-.25,-2.2],
// 3 16 18.755 -.25 -8.2915 11.5625 -.25 -2.2 11.0868 -.25 -4.5924
  [3,16,18.755,-.25,-8.2915,11.5625,-.25,-2.2,11.0868,-.25,-4.5924],
// 4 16 12 -.25 -12 21.5662 -.25 -11.6778 18.755 -.25 -8.2915 11.0868 -.25 -4.5924
  [4,16,12,-.25,-12,21.5662,-.25,-11.6778,18.755,-.25,-8.2915,11.0868,-.25,-4.5924],
// 
// 3 16 -35 -.25 0 -35 -.25 -12 -21.5662 -.25 -11.6778
  [3,16,-35,-.25,0,-35,-.25,-12,-21.5662,-.25,-11.6778],
// 3 16 -35 -.25 12 -35 -.25 0 -21.5662 -.25 11.6778
  [3,16,-35,-.25,12,-35,-.25,0,-21.5662,-.25,11.6778],
// 3 16 35 -.25 -12 35 -.25 0 21.5662 -.25 -11.6778
  [3,16,35,-.25,-12,35,-.25,0,21.5662,-.25,-11.6778],
// 3 16 35 -.25 0 35 -.25 12 21.5662 -.25 11.6778
  [3,16,35,-.25,0,35,-.25,12,21.5662,-.25,11.6778],
];
module ldraw_lib__logo_train_2006_box(step=0, col=false, unit=2/5, alt=false, line=0.2, solid=!$preview)
    makepoly(ldraw_lib__logo_train_2006_box(), step=step, col=col, unit=unit, alt=alt, line=line, solid=solid);
ldraw_lib__logo_train_2006_box(line=0.2);
// file: ../p/box5-12.scad
use <../lib.scad>
function ldraw_lib__box5_12() = [
// 0 Box with 5 Faces without Any Edges
// 0 Name: box5-12.dat
// 0 Author: Chris Dee [cwdee]
// 0 !LDRAW_ORG Primitive UPDATE 2009-02
// 0 !LICENSE Licensed under CC BY 4.0 : see CAreadme.txt
// 
// 0 BFC CERTIFY CCW
  [0,"BFC","CERTIFY"],
  [0,"BFC","CCW"],
// 
// 0 !HISTORY 2009-09-03 [PTadmin] Official Update 2009-02
// 
// 
// 4 16 1 1 1 1 1 -1 -1 1 -1 -1 1 1
  [4,16,1,1,1,1,1,-1,-1,1,-1,-1,1,1],
// 4 16 -1 0 1 1 0 1 1 1 1 -1 1 1
  [4,16,-1,0,1,1,0,1,1,1,1,-1,1,1],
// 4 16 -1 0 -1 -1 0 1 -1 1 1 -1 1 -1
  [4,16,-1,0,-1,-1,0,1,-1,1,1,-1,1,-1],
// 4 16 1 0 -1 -1 0 -1 -1 1 -1 1 1 -1
  [4,16,1,0,-1,-1,0,-1,-1,1,-1,1,1,-1],
// 4 16 1 0 1 1 0 -1 1 1 -1 1 1 1
  [4,16,1,0,1,1,0,-1,1,1,-1,1,1,1],
// 0
];
module ldraw_lib__box5_12(step=0, col=false, unit=2/5, alt=false, line=0.2, solid=!$preview)
    makepoly(ldraw_lib__box5_12(), step=step, col=col, unit=unit, alt=alt, line=line, solid=solid);
ldraw_lib__box5_12(line=0.2);
// main file
use <../lib.scad>
use <../p/box5-12.scad>
use <../p/logo-train-2006-box.scad>
use <../p/logo-train-2006.scad>
function ldraw_lib__4296207e() = [
// 0 Sticker  0.6 x  1.2 with Light Bluish Grey Train Logo (2006)
// 0 Name: 4296207e.dat
// 0 Author: Gerald Lasser [GeraldLasser]
// 0 !LDRAW_ORG Part UPDATE 2023-07
// 0 !LICENSE Licensed under CC BY 4.0 : see CAreadme.txt
// 
// 0 BFC CERTIFY CCW
  [0,"BFC","CERTIFY"],
  [0,"BFC","CCW"],
// 
// 0 !KEYWORDS Set 7897
// 
// 0 !HISTORY 2023-12-31 [OrionP] Official Update 2023-07
// 
// 
// 1 16 0 -.25 0 12.25 0 0 0 .25 0 0 0 6 box5-12.dat
  [1,16,0,-.25,0,12.25,0,0,0,.25,0,0,0,6, ldraw_lib__box5_12()],
// 
// 1 71 0 0 0 .2857 0 0 0 1 0 0 0 .2857 logo-train-2006.dat
  [1,71,0,0,0,.2857,0,0,0,1,0,0,0,.2857, ldraw_lib__logo_train_2006()],
// 1 16 0 0 0 .2857 0 0 0 1 0 0 0 .2857 logo-train-2006-box.dat
  [1,16,0,0,0,.2857,0,0,0,1,0,0,0,.2857, ldraw_lib__logo_train_2006_box()],
// 
// 3 16 -12.25 -.25 6 -9.9995 -.25 3.4284 -6.16146334 -.25 3.33634746
  [3,16,-12.25,-.25,6,-9.9995,-.25,3.4284,-6.16146334,-.25,3.33634746],
// 3 16 -12.25 -.25 6 -6.16146334 -.25 3.33634746 -3.4284 -.25 3.4284
  [3,16,-12.25,-.25,6,-6.16146334,-.25,3.33634746,-3.4284,-.25,3.4284],
// 3 16 -12.25 -.25 6 -3.4284 -.25 3.4284 0 -.25 3.4284
  [3,16,-12.25,-.25,6,-3.4284,-.25,3.4284,0,-.25,3.4284],
// 3 16 -12.25 -.25 6 0 -.25 3.4284 12.25 -.25 6
  [3,16,-12.25,-.25,6,0,-.25,3.4284,12.25,-.25,6],
// 3 16 12.25 -.25 6 0 -.25 3.4284 3.4284 -.25 3.4284
  [3,16,12.25,-.25,6,0,-.25,3.4284,3.4284,-.25,3.4284],
// 3 16 12.25 -.25 6 3.4284 -.25 3.4284 6.16146334 -.25 3.33634746
  [3,16,12.25,-.25,6,3.4284,-.25,3.4284,6.16146334,-.25,3.33634746],
// 3 16 12.25 -.25 6 6.16146334 -.25 3.33634746 9.9995 -.25 3.4284
  [3,16,12.25,-.25,6,6.16146334,-.25,3.33634746,9.9995,-.25,3.4284],
// 3 16 9.9995 -.25 3.4284 9.9995 -.25 0 12.25 -.25 6
  [3,16,9.9995,-.25,3.4284,9.9995,-.25,0,12.25,-.25,6],
// 3 16 12.25 -.25 6 9.9995 -.25 0 12.25 -.25 -6
  [3,16,12.25,-.25,6,9.9995,-.25,0,12.25,-.25,-6],
// 3 16 12.25 -.25 -6 9.9995 -.25 0 9.9995 -.25 -3.4284
  [3,16,12.25,-.25,-6,9.9995,-.25,0,9.9995,-.25,-3.4284],
// 3 16 12.25 -.25 -6 9.9995 -.25 -3.4284 6.16146334 -.25 -3.33634746
  [3,16,12.25,-.25,-6,9.9995,-.25,-3.4284,6.16146334,-.25,-3.33634746],
// 3 16 12.25 -.25 -6 6.16146334 -.25 -3.33634746 3.4284 -.25 -3.4284
  [3,16,12.25,-.25,-6,6.16146334,-.25,-3.33634746,3.4284,-.25,-3.4284],
// 3 16 12.25 -.25 -6 3.4284 -.25 -3.4284 0 -.25 -3.4284
  [3,16,12.25,-.25,-6,3.4284,-.25,-3.4284,0,-.25,-3.4284],
// 3 16 12.25 -.25 -6 0 -.25 -3.4284 -12.25 -.25 -6
  [3,16,12.25,-.25,-6,0,-.25,-3.4284,-12.25,-.25,-6],
// 3 16 -12.25 -.25 -6 0 -.25 -3.4284 -3.4284 -.25 -3.4284
  [3,16,-12.25,-.25,-6,0,-.25,-3.4284,-3.4284,-.25,-3.4284],
// 3 16 -12.25 -.25 -6 -3.4284 -.25 -3.4284 -6.16146334 -.25 -3.33634746
  [3,16,-12.25,-.25,-6,-3.4284,-.25,-3.4284,-6.16146334,-.25,-3.33634746],
// 3 16 -12.25 -.25 -6 -6.16146334 -.25 -3.33634746 -9.9995 -.25 -3.4284
  [3,16,-12.25,-.25,-6,-6.16146334,-.25,-3.33634746,-9.9995,-.25,-3.4284],
// 3 16 -12.25 -.25 -6 -9.9995 -.25 -3.4284 -9.9995 -.25 0
  [3,16,-12.25,-.25,-6,-9.9995,-.25,-3.4284,-9.9995,-.25,0],
// 3 16 -12.25 -.25 -6 -9.9995 -.25 0 -12.25 -.25 6
  [3,16,-12.25,-.25,-6,-9.9995,-.25,0,-12.25,-.25,6],
// 3 16 -12.25 -.25 6 -9.9995 -.25 0 -9.9995 -.25 3.4284
  [3,16,-12.25,-.25,6,-9.9995,-.25,0,-9.9995,-.25,3.4284],
];
module ldraw_lib__4296207e(step=0, col=false, unit=2/5, alt=false, line=0.2, solid=!$preview)
    makepoly(ldraw_lib__4296207e(), step=step, col=col, unit=unit, alt=alt, line=line, solid=solid);
ldraw_lib__4296207e(line=0.2);
